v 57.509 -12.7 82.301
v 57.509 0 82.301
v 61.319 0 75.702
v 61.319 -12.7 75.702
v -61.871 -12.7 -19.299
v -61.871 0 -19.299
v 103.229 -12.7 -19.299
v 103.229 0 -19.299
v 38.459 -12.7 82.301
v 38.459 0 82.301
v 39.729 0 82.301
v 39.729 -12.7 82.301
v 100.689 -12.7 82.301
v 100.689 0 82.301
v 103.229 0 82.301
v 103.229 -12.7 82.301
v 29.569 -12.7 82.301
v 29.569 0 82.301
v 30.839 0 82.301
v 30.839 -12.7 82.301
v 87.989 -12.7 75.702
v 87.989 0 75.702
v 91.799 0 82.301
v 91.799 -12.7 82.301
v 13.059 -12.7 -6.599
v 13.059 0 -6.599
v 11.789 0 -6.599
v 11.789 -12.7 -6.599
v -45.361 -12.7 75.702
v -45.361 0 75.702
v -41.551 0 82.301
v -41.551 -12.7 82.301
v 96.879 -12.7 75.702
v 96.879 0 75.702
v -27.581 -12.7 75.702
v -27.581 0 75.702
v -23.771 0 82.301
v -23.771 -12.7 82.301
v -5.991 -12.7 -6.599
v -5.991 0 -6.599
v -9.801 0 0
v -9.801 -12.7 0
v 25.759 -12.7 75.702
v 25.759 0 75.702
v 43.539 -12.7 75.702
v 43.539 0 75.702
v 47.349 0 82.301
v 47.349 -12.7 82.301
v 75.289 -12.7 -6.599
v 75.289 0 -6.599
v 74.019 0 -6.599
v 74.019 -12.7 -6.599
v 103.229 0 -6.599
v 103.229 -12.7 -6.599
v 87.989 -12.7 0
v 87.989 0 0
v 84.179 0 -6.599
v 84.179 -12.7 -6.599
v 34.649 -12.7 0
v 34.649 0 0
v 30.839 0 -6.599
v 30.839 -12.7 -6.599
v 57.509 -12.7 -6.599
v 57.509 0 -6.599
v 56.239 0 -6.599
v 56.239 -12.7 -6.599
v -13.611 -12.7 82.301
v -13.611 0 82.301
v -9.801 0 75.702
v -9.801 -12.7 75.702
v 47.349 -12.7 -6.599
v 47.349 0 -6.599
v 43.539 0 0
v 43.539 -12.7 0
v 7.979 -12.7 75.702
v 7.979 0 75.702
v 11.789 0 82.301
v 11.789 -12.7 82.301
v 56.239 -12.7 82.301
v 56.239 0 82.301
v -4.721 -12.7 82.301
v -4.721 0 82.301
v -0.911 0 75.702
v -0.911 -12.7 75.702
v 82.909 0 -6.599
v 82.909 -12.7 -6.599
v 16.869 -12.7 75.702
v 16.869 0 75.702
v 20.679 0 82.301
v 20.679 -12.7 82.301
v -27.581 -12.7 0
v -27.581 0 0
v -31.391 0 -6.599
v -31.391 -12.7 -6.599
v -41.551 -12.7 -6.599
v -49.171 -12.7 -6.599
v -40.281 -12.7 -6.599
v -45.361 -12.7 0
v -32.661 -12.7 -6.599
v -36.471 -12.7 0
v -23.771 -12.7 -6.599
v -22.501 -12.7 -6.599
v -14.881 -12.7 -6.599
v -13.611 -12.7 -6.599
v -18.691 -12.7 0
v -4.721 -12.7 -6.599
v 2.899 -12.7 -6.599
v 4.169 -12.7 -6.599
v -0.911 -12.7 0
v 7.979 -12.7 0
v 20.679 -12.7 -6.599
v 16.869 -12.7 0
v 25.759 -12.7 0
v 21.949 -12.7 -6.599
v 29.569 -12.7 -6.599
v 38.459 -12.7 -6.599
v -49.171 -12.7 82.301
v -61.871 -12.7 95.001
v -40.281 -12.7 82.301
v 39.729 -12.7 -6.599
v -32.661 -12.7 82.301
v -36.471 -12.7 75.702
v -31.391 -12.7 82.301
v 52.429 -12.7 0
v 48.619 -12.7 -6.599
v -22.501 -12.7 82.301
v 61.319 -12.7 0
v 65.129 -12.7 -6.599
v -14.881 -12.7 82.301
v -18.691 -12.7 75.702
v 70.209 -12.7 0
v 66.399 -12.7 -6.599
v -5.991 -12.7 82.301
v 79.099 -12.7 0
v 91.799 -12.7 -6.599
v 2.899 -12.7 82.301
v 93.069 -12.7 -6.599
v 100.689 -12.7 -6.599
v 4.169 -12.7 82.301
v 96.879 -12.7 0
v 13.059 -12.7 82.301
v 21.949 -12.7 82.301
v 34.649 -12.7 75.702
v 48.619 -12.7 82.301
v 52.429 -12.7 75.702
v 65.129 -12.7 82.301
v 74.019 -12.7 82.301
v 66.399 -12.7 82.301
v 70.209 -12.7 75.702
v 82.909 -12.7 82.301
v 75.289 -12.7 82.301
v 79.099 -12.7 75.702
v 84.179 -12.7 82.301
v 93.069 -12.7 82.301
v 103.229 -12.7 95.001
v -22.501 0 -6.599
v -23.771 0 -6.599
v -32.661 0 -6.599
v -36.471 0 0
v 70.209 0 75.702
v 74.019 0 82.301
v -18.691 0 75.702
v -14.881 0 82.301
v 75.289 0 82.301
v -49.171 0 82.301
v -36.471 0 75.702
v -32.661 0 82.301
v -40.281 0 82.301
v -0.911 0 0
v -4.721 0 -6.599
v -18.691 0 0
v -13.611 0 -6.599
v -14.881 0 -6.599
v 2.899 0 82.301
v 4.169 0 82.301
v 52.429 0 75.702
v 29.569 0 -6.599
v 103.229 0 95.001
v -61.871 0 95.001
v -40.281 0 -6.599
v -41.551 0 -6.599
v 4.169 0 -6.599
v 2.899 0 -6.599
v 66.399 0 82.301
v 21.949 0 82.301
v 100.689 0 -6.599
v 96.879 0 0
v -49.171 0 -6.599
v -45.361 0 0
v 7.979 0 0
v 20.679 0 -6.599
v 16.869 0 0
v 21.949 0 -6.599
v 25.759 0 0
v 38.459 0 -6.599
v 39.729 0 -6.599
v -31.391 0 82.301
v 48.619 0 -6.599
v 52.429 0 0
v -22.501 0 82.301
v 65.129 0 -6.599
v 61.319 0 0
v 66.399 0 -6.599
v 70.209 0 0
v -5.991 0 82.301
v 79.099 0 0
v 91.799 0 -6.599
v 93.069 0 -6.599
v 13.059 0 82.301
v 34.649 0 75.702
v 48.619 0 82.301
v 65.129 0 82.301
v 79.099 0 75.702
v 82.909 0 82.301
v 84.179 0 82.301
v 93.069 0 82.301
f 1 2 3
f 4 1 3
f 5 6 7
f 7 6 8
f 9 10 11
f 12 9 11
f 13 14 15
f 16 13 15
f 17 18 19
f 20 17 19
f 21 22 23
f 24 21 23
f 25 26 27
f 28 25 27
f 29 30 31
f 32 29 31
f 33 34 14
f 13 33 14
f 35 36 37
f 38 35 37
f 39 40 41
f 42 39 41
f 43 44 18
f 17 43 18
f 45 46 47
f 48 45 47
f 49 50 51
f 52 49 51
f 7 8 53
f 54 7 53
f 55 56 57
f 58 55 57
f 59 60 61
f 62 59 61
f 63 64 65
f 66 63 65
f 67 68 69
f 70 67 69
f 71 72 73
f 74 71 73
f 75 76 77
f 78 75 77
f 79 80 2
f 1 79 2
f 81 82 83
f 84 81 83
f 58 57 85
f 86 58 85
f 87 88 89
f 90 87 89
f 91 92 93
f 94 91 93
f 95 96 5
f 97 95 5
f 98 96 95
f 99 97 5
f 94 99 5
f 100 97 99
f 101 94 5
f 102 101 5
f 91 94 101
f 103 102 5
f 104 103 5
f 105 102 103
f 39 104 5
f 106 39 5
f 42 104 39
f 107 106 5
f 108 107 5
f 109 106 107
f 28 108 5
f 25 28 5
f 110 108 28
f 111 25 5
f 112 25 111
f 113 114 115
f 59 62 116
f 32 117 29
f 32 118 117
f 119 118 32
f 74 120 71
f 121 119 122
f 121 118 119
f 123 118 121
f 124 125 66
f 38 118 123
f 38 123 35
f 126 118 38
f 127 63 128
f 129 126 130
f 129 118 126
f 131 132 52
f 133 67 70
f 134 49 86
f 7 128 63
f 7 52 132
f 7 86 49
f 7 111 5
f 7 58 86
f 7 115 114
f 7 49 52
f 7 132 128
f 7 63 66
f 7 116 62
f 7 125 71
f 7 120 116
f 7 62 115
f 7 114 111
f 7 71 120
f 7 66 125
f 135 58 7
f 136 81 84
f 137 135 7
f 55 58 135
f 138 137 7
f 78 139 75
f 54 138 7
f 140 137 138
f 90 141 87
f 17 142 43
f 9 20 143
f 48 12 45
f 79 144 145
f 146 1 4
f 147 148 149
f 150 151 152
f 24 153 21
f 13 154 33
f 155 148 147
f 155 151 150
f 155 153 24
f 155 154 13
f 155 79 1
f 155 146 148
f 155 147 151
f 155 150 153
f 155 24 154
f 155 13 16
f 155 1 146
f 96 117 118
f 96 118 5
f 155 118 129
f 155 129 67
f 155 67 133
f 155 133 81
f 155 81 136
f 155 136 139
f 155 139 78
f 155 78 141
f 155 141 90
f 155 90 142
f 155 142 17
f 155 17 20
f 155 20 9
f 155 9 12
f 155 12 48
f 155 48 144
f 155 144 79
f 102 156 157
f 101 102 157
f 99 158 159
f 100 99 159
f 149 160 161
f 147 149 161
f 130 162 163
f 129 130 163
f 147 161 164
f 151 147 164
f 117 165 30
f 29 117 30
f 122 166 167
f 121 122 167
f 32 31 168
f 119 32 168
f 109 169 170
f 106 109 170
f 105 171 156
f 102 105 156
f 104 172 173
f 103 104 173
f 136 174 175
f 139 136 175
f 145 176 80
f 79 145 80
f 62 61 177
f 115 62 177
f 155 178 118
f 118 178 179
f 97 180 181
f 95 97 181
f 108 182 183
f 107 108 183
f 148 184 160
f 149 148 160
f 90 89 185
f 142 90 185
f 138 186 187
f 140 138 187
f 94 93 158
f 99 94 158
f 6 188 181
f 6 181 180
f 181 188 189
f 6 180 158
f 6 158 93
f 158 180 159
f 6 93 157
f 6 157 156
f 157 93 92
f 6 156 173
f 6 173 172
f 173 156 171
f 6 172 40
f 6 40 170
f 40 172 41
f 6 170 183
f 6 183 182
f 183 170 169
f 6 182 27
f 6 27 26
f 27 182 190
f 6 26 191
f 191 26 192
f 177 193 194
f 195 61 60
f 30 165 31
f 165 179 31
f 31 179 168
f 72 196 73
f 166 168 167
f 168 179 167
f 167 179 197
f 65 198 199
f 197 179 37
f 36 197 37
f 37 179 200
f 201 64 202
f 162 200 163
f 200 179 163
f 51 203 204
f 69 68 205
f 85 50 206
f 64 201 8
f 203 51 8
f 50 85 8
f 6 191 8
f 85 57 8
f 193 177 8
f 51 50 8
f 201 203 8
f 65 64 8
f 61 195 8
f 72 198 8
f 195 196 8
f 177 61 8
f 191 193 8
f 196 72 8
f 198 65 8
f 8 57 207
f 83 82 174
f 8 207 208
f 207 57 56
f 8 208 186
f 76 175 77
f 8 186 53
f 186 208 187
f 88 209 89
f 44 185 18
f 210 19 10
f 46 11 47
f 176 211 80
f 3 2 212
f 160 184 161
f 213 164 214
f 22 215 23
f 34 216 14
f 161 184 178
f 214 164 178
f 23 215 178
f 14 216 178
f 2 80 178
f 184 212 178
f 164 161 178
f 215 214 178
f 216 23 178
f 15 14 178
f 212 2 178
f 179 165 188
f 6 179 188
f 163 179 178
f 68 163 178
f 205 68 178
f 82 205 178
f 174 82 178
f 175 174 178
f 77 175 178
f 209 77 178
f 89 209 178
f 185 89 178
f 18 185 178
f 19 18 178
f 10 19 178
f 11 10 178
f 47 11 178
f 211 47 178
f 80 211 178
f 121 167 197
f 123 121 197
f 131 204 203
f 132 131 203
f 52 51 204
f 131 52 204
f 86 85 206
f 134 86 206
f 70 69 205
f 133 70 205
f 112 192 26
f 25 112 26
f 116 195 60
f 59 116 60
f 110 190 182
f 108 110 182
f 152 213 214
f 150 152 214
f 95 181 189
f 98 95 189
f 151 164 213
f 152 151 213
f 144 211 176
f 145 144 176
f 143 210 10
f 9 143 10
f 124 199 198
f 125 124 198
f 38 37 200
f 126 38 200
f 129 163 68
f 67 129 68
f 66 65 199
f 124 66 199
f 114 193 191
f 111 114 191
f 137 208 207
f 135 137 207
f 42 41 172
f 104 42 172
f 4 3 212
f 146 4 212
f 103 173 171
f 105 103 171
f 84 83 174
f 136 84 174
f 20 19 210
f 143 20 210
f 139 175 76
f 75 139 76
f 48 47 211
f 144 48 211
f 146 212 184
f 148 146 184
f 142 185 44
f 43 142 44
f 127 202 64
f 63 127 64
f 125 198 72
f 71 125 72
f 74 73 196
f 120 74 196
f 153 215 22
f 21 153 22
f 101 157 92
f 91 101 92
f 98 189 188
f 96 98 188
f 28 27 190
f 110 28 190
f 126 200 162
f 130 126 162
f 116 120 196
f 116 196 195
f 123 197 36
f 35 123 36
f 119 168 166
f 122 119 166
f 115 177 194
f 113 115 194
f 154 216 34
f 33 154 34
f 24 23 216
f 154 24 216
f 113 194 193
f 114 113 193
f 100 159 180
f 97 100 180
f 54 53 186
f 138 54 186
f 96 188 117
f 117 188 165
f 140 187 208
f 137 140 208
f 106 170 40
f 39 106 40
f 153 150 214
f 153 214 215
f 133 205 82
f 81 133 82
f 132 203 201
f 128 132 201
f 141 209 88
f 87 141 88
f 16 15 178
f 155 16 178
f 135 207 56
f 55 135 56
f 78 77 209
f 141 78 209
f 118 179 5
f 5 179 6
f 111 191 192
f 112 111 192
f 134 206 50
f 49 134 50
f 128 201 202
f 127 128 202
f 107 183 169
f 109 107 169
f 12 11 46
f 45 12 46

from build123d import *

# Parameters (mm, degrees)
F1_DEPTH = 12.7


with BuildPart() as f1:
    # F0 (on Front) → F1 (new body)
    with BuildSketch(Plane.XZ):
        Polygon((-49.171232, -6.599114), (-49.171232, 82.300886), (-41.551232, 82.300886), (-40.281232, 82.300886), (-32.661232, 82.300886), (-31.391232, 82.300886), (-23.771232, 82.300886), (-22.501232, 82.300886), (-14.881232, 82.300886), (-13.611232, 82.300886), (-5.991232, 82.300886), (-4.721232, 82.300886), (2.898768, 82.300886), (4.168768, 82.300886), (11.788768, 82.300886), (13.058768, 82.300886), (20.678768, 82.300886), (21.948768, 82.300886), (29.568768, 82.300886), (30.838768, 82.300886), (38.458768, 82.300886), (39.728768, 82.300886), (47.348768, 82.300886), (48.618768, 82.300886), (56.238768, 82.300886), (57.508768, 82.300886), (65.128768, 82.300886), (66.398768, 82.300886), (74.018768, 82.300886), (75.288768, 82.300886), (82.908768, 82.300886), (84.178768, 82.300886), (91.798768, 82.300886), (93.068768, 82.300886), (100.688768, 82.300886), (103.228768, 82.300886), (103.228768, 95.000886), (-61.871232, 95.000886), (-61.871232, -19.299114), (81.130768, -19.299114), (103.228768, -19.299114), (103.228768, -6.599114), (100.688768, -6.599114), (93.068768, -6.599114), (91.798768, -6.599114), (84.178768, -6.599114), (82.908768, -6.599114), (75.288768, -6.599114), (74.018768, -6.599114), (66.398768, -6.599114), (65.128768, -6.599114), (57.508768, -6.599114), (56.238768, -6.599114), (48.618768, -6.599114), (47.348768, -6.599114), (39.728768, -6.599114), (38.458768, -6.599114), (30.838768, -6.599114), (29.568768, -6.599114), (21.948768, -6.599114), (20.678768, -6.599114), (13.058768, -6.599114), (11.788768, -6.599114), (4.168768, -6.599114), (2.898768, -6.599114), (-4.721232, -6.599114), (-5.991232, -6.599114), (-13.611232, -6.599114), (-14.881232, -6.599114), (-22.501232, -6.599114), (-23.771232, -6.599114), (-31.391232, -6.599114), (-32.661232, -6.599114), (-40.281232, -6.599114), (-41.551232, -6.599114), align=None)
        Polygon((-41.551232, 82.300886), (-49.171232, 82.300886), (-45.361232, 75.701773), align=None)
        Polygon((-45.361232, 0), (-49.171232, -6.599114), (-41.551232, -6.599114), align=None)
        Polygon((-32.661232, 82.300886), (-40.281232, 82.300886), (-36.471232, 75.701773), align=None)
        Polygon((-36.471232, 0), (-40.281232, -6.599114), (-32.661232, -6.599114), align=None)
        Polygon((-23.771232, 82.300886), (-31.391232, 82.300886), (-27.581232, 75.701773), align=None)
        Polygon((-27.581232, 0), (-31.391232, -6.599114), (-23.771232, -6.599114), align=None)
        Polygon((-14.881232, 82.300886), (-22.501232, 82.300886), (-18.691232, 75.701773), align=None)
        Polygon((-18.691232, 0), (-22.501232, -6.599114), (-14.881232, -6.599114), align=None)
        Polygon((-5.991232, 82.300886), (-13.611232, 82.300886), (-9.801232, 75.701773), align=None)
        Polygon((-9.801232, 0), (-13.611232, -6.599114), (-5.991232, -6.599114), align=None)
        Polygon((2.898768, 82.300886), (-4.721232, 82.300886), (-0.911232, 75.701773), align=None)
        Polygon((-0.911232, 0), (-4.721232, -6.599114), (2.898768, -6.599114), align=None)
        Polygon((11.788768, 82.300886), (4.168768, 82.300886), (7.978768, 75.701773), align=None)
        Polygon((7.978768, 0), (4.168768, -6.599114), (11.788768, -6.599114), align=None)
        Polygon((20.678768, 82.300886), (13.058768, 82.300886), (16.868768, 75.701773), align=None)
        Polygon((16.868768, 0), (13.058768, -6.599114), (20.678768, -6.599114), align=None)
        Polygon((29.568768, 82.300886), (21.948768, 82.300886), (25.758768, 75.701773), align=None)
        Polygon((25.758768, 0), (21.948768, -6.599114), (29.568768, -6.599114), align=None)
        Polygon((38.458768, 82.300886), (30.838768, 82.300886), (34.648768, 75.701773), align=None)
        Polygon((34.648768, 0), (30.838768, -6.599114), (38.458768, -6.599114), align=None)
        Polygon((47.348768, 82.300886), (39.728768, 82.300886), (43.538768, 75.701773), align=None)
        Polygon((43.538768, 0), (39.728768, -6.599114), (47.348768, -6.599114), align=None)
        Polygon((56.238768, 82.300886), (48.618768, 82.300886), (52.428768, 75.701773), align=None)
        Polygon((52.428768, 0), (48.618768, -6.599114), (56.238768, -6.599114), align=None)
        Polygon((65.128768, 82.300886), (57.508768, 82.300886), (61.318768, 75.701773), align=None)
        Polygon((61.318768, 0), (57.508768, -6.599114), (65.128768, -6.599114), align=None)
        Polygon((74.018768, 82.300886), (66.398768, 82.300886), (70.208768, 75.701773), align=None)
        Polygon((70.208768, 0), (66.398768, -6.599114), (74.018768, -6.599114), align=None)
        Polygon((82.908768, 82.300886), (75.288768, 82.300886), (79.098768, 75.701773), align=None)
        Polygon((79.098768, 0), (75.288768, -6.599114), (82.908768, -6.599114), align=None)
        Polygon((91.798768, 82.300886), (84.178768, 82.300886), (87.988768, 75.701773), align=None)
        Polygon((87.988768, 0), (84.178768, -6.599114), (91.798768, -6.599114), align=None)
        Polygon((100.688768, 82.300886), (93.068768, 82.300886), (96.878768, 75.701773), align=None)
        Polygon((96.878768, 0), (93.068768, -6.599114), (100.688768, -6.599114), align=None)
    extrude(amount=F1_DEPTH)


solid = f1.part
